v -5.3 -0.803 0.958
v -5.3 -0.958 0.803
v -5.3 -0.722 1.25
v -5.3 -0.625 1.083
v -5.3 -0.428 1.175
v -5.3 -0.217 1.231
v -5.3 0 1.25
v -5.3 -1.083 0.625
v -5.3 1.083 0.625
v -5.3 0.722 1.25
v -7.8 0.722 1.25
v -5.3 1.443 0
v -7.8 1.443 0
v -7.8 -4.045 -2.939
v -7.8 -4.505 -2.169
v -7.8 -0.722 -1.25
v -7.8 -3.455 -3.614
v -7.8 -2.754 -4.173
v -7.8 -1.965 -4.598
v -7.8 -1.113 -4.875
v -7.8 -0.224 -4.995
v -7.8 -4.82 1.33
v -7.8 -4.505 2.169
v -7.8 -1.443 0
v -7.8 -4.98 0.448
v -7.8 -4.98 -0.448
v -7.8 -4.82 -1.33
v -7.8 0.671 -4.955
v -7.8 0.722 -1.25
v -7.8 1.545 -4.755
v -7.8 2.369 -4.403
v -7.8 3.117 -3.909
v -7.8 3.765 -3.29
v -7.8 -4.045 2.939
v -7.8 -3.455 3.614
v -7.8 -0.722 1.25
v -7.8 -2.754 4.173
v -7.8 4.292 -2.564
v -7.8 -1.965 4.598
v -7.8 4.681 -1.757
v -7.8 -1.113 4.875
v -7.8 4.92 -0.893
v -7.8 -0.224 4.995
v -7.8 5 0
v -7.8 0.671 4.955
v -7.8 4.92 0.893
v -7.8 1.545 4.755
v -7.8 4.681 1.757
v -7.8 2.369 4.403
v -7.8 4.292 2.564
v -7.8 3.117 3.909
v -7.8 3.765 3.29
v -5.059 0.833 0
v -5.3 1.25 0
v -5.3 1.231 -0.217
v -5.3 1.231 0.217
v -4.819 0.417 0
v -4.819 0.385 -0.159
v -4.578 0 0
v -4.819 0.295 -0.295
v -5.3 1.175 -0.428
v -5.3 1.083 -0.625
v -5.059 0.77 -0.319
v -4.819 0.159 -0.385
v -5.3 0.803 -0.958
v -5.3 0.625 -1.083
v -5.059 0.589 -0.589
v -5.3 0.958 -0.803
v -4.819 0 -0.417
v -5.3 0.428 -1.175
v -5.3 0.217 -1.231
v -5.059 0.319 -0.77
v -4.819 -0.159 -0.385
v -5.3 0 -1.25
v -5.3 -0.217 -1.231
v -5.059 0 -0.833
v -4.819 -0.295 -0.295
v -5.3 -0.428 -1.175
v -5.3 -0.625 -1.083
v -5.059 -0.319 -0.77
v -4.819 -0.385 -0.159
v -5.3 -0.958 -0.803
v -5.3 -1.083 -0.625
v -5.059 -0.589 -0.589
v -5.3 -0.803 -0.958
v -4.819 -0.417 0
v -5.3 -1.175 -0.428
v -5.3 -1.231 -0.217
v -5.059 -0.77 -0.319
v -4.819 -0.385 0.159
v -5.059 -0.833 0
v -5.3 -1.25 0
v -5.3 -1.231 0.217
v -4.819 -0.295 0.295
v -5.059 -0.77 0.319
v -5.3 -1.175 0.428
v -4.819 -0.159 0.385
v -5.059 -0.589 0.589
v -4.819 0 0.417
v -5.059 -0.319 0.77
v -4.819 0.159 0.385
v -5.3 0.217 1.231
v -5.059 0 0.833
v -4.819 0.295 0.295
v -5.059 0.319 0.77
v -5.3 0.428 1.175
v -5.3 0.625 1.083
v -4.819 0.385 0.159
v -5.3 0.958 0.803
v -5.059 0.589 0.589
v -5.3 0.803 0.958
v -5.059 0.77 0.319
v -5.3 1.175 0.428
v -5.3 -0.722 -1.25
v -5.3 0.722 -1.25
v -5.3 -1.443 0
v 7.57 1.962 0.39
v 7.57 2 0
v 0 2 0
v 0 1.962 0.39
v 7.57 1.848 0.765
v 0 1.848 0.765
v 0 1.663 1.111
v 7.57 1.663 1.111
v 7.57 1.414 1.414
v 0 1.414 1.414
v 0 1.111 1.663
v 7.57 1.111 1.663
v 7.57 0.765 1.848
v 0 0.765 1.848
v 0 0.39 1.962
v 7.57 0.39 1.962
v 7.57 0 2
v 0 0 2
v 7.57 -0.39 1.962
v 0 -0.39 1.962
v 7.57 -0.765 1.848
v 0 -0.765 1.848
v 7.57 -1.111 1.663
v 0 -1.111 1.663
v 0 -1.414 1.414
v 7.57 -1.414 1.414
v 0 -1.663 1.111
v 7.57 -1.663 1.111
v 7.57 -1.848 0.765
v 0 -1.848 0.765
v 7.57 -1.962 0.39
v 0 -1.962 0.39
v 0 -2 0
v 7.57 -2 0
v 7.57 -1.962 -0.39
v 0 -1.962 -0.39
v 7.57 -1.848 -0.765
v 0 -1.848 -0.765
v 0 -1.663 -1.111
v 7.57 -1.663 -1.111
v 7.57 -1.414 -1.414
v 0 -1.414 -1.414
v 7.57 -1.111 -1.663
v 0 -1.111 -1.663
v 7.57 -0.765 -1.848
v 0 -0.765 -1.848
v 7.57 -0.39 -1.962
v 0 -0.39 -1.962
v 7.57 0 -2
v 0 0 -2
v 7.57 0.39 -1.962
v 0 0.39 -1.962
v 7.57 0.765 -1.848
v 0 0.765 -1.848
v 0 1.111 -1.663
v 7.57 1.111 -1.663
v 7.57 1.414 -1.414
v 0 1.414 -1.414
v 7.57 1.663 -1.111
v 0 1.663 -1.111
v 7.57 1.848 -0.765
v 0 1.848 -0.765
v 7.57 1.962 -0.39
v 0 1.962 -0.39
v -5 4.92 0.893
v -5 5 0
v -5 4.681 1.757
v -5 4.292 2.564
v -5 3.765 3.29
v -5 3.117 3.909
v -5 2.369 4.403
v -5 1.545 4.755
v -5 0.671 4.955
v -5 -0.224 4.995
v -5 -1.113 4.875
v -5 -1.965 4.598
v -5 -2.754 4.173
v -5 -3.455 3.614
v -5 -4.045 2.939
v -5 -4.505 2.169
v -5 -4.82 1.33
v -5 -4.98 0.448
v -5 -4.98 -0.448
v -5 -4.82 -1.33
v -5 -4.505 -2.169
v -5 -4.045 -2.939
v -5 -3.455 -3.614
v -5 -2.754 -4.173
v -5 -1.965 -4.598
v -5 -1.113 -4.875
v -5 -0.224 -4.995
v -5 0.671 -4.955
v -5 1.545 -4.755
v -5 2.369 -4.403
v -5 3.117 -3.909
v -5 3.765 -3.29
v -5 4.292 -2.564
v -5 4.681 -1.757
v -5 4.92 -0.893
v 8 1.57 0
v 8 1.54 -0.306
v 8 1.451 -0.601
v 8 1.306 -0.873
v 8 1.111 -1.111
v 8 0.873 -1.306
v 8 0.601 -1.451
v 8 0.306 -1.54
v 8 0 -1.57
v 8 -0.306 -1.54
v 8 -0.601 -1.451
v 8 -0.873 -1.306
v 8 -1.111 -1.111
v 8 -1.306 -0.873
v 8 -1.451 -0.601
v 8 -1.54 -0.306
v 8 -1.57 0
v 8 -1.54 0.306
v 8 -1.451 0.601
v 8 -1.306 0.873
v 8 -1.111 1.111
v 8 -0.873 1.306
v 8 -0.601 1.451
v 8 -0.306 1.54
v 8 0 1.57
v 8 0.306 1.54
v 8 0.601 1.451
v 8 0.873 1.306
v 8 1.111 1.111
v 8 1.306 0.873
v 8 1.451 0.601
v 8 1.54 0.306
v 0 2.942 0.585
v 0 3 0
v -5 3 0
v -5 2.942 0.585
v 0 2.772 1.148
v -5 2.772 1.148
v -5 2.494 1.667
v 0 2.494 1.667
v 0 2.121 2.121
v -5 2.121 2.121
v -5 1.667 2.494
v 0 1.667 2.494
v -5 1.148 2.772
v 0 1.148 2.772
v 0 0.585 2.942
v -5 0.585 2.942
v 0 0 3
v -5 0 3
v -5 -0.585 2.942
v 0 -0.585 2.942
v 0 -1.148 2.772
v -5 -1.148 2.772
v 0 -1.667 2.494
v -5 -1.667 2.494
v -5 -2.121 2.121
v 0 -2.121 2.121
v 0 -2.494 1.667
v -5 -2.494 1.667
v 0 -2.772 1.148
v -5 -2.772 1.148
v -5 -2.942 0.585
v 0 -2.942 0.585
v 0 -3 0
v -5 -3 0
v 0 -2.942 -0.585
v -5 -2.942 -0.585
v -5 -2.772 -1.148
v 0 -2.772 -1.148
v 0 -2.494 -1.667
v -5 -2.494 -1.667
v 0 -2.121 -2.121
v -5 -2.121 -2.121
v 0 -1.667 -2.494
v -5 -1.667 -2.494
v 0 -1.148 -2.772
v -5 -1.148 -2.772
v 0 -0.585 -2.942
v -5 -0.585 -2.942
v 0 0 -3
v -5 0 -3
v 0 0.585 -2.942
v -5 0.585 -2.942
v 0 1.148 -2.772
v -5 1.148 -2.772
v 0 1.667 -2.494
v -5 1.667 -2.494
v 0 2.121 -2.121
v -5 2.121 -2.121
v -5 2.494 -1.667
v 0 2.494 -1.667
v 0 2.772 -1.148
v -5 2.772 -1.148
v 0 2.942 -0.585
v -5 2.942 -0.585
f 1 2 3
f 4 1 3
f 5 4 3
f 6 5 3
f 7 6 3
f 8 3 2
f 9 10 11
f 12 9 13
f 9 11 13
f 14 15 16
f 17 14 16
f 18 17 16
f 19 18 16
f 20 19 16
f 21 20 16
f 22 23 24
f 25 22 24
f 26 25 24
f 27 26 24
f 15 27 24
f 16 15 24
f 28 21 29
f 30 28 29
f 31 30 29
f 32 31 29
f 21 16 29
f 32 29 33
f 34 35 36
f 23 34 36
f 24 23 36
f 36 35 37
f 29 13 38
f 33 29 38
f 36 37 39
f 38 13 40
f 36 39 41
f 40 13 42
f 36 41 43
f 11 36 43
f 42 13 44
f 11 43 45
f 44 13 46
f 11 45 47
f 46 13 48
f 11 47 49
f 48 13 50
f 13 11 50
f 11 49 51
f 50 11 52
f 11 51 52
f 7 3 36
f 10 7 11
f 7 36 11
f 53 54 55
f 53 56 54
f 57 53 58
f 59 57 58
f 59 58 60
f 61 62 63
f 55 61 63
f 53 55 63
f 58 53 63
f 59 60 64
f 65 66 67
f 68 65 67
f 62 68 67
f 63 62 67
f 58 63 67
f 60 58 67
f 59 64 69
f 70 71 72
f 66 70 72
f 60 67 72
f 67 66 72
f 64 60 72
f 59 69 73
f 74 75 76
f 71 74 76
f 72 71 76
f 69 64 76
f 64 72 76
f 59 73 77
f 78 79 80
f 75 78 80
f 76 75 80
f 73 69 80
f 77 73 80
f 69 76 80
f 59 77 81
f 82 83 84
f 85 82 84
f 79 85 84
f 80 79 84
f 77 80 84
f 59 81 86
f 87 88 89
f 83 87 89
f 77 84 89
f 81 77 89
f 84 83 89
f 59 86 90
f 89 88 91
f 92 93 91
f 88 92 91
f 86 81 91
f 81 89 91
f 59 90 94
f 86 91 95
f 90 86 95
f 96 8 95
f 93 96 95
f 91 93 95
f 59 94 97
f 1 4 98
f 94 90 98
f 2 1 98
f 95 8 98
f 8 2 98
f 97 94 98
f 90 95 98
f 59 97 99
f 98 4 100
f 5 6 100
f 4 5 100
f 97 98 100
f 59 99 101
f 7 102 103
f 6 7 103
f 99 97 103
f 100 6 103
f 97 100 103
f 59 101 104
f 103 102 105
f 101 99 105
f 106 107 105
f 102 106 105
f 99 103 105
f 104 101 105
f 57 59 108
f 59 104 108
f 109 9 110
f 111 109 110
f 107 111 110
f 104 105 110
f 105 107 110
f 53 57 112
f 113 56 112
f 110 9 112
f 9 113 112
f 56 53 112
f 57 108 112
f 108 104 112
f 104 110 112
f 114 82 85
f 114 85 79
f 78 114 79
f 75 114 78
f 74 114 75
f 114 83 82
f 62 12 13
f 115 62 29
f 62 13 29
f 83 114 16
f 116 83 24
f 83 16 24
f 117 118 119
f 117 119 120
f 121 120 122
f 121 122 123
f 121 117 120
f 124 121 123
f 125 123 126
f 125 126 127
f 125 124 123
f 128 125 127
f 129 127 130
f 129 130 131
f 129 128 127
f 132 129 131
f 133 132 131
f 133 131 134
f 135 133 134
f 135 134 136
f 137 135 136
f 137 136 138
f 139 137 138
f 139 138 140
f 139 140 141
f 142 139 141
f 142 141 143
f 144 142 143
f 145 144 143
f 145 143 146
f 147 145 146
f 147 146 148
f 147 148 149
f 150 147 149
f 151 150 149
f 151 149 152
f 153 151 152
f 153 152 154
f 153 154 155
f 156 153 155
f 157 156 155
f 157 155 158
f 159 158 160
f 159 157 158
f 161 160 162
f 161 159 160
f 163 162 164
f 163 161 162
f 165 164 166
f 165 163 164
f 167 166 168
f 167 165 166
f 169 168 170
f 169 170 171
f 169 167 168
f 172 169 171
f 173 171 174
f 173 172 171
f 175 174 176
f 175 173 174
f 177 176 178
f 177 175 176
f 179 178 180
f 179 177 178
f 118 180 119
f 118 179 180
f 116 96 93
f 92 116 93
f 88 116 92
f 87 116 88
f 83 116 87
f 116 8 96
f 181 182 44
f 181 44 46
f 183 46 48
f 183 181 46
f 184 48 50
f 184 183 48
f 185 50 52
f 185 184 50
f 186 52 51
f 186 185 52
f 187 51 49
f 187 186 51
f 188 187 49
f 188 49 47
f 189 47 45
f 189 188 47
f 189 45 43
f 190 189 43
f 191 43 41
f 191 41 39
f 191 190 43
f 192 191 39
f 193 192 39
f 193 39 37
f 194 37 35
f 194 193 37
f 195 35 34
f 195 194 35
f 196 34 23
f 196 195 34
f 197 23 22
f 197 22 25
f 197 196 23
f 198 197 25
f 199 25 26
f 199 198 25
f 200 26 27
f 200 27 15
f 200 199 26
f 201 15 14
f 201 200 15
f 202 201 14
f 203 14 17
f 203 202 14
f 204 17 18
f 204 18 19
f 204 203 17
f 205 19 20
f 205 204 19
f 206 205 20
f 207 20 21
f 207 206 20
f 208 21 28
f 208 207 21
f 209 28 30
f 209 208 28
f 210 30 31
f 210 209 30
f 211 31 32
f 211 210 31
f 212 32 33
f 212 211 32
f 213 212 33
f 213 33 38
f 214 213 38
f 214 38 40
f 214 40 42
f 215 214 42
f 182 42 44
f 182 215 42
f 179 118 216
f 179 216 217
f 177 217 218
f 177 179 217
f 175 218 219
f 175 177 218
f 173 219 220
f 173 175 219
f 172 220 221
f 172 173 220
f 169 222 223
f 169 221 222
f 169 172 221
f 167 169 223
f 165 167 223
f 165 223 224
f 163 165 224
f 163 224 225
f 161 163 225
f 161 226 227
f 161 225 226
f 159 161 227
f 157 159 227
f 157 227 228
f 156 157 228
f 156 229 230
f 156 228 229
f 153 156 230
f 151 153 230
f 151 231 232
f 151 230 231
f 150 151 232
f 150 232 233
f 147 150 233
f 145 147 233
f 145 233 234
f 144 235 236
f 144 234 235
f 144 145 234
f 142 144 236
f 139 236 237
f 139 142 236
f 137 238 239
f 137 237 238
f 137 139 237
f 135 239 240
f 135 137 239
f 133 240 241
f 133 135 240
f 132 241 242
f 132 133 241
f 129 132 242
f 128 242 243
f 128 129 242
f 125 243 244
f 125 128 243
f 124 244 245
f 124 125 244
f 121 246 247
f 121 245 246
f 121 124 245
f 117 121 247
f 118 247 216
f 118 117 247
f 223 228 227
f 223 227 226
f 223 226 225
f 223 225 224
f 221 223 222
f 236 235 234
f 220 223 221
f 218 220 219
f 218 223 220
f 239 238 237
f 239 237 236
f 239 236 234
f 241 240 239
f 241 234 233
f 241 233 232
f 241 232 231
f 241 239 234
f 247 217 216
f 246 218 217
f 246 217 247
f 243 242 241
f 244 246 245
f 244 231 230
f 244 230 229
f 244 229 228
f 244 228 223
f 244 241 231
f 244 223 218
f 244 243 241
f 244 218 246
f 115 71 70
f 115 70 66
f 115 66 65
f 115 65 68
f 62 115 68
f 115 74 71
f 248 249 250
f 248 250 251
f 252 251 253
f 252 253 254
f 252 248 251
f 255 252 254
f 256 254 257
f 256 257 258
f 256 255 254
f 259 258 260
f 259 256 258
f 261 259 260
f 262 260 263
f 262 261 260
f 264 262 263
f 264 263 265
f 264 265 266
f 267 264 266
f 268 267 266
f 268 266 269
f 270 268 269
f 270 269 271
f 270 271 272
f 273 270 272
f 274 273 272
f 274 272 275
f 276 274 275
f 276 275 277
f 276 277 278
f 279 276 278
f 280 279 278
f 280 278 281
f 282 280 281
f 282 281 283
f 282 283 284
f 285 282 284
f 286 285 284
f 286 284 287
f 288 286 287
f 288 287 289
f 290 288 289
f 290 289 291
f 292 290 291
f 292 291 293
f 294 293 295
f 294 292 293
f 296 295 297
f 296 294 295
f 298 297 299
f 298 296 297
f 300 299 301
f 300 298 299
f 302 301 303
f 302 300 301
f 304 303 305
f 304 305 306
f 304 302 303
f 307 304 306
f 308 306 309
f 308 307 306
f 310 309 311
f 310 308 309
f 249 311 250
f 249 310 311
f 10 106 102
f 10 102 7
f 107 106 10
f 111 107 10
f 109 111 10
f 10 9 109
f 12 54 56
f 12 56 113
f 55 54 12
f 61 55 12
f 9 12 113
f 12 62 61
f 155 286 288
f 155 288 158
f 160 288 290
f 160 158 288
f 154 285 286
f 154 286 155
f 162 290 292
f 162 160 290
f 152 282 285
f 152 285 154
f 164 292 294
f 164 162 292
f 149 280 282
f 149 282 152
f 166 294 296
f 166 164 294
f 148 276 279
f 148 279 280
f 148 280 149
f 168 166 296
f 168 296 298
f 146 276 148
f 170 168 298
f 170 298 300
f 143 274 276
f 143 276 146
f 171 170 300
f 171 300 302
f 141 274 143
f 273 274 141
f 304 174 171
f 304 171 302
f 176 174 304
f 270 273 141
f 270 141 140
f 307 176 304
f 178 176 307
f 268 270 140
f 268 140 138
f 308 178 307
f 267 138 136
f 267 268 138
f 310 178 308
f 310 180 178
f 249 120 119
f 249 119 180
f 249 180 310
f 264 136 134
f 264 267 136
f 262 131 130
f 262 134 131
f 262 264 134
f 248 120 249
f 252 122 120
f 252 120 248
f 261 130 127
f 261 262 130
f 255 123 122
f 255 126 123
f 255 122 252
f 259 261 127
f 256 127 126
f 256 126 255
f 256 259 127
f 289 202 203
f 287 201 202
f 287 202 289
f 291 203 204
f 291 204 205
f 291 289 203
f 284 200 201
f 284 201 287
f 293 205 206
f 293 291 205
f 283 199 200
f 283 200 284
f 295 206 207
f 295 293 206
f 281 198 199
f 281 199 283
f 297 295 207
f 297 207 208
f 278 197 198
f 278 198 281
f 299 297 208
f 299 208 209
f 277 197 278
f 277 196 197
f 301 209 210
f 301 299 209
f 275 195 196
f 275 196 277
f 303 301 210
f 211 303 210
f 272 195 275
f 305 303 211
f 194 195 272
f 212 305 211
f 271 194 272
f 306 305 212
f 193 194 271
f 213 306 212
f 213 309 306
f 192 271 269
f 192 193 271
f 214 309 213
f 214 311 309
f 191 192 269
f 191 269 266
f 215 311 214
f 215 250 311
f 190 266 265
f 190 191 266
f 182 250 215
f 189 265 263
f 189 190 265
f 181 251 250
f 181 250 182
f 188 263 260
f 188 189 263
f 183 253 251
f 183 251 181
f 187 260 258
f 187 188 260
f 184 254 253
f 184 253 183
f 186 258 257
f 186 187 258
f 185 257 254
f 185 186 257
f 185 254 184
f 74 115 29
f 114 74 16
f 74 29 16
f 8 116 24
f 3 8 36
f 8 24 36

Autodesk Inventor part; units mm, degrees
ref_plane "YZ Plane" through (0, 0, 0) normal (1, 0, 0) x (0, 1, 0)
ref_plane "XZ Plane" through (0, 0, 0) normal (0, 1, 0) x (-1, 0, 0)
ref_plane "XY Plane" through (0, 0, 0) normal (0, 0, 1) x (1, 0, 0)
sketch "Sketch_1" plane through (0, 0, 0) normal (0, 0, 1) x (1, 0, 0)
  line L0 (8, 0) -> (-7.8, 0)
  line L1 (-7.8, 0) -> (-7.8, 5)
  line L2 (-7.8, 5) -> (-5, 5)
  line L3 (-5, 5) -> (-5, 3)
  line L4 (-5, 3) -> (0, 3)
  line L5 (0, 3) -> (0, 2)
  line L6 (0, 2) -> (7.5705, 2)
  line L7 (7.5705, 2) -> (8, 1.5705)
  line L8 (8, 1.5705) -> (8, 0)
  line L9 (8, 0) -> (-7.8, 0)
revolve "Revolution1" add sketch "Sketch_1" angle 360 about axis through (8, 0, 0) along (1, 0, 0)
thread "Thread1" size "M4x0.7" class "6g" standard "ISO Metric profile" length 6.3705
sketch "Sketch_2" plane through (-7.8, 0, 0) normal (-1, 0, 0) x (0, 1, 0)
  line L0 (-1.4434, 0) -> (-0.7217, -1.25)
  line L1 (-0.7217, -1.25) -> (0.7217, -1.25)
  line L2 (0.7217, -1.25) -> (1.4434, 0)
  line L3 (1.4434, 0) -> (0.7217, 1.25)
  line L4 (0.7217, 1.25) -> (-0.7217, 1.25)
  line L5 (-0.7217, 1.25) -> (-1.4434, 0)
extrude "Extrusion1" cut sketch "Sketch_2" against normal blind 2.5
sketch "Sketch_3" plane through (0, 0, 0) normal (0, 0, 1) x (1, 0, 0)
  line L0 (-4.5783, 0) -> (-5.3, 0)
  line L1 (-5.3, 0) -> (-5.3, 1.25)
  line L2 (-5.3, 1.25) -> (-4.5783, 0)
  line L3 (-4.5783, 0) -> (-5.3, 0)
revolve "Revolution2" cut sketch "Sketch_3" angle 360 about axis through (-4.5783, 0, 0) along (1, 0, 0)
properties part number "DBSY4-5-8" material "스테인리스스틸"
